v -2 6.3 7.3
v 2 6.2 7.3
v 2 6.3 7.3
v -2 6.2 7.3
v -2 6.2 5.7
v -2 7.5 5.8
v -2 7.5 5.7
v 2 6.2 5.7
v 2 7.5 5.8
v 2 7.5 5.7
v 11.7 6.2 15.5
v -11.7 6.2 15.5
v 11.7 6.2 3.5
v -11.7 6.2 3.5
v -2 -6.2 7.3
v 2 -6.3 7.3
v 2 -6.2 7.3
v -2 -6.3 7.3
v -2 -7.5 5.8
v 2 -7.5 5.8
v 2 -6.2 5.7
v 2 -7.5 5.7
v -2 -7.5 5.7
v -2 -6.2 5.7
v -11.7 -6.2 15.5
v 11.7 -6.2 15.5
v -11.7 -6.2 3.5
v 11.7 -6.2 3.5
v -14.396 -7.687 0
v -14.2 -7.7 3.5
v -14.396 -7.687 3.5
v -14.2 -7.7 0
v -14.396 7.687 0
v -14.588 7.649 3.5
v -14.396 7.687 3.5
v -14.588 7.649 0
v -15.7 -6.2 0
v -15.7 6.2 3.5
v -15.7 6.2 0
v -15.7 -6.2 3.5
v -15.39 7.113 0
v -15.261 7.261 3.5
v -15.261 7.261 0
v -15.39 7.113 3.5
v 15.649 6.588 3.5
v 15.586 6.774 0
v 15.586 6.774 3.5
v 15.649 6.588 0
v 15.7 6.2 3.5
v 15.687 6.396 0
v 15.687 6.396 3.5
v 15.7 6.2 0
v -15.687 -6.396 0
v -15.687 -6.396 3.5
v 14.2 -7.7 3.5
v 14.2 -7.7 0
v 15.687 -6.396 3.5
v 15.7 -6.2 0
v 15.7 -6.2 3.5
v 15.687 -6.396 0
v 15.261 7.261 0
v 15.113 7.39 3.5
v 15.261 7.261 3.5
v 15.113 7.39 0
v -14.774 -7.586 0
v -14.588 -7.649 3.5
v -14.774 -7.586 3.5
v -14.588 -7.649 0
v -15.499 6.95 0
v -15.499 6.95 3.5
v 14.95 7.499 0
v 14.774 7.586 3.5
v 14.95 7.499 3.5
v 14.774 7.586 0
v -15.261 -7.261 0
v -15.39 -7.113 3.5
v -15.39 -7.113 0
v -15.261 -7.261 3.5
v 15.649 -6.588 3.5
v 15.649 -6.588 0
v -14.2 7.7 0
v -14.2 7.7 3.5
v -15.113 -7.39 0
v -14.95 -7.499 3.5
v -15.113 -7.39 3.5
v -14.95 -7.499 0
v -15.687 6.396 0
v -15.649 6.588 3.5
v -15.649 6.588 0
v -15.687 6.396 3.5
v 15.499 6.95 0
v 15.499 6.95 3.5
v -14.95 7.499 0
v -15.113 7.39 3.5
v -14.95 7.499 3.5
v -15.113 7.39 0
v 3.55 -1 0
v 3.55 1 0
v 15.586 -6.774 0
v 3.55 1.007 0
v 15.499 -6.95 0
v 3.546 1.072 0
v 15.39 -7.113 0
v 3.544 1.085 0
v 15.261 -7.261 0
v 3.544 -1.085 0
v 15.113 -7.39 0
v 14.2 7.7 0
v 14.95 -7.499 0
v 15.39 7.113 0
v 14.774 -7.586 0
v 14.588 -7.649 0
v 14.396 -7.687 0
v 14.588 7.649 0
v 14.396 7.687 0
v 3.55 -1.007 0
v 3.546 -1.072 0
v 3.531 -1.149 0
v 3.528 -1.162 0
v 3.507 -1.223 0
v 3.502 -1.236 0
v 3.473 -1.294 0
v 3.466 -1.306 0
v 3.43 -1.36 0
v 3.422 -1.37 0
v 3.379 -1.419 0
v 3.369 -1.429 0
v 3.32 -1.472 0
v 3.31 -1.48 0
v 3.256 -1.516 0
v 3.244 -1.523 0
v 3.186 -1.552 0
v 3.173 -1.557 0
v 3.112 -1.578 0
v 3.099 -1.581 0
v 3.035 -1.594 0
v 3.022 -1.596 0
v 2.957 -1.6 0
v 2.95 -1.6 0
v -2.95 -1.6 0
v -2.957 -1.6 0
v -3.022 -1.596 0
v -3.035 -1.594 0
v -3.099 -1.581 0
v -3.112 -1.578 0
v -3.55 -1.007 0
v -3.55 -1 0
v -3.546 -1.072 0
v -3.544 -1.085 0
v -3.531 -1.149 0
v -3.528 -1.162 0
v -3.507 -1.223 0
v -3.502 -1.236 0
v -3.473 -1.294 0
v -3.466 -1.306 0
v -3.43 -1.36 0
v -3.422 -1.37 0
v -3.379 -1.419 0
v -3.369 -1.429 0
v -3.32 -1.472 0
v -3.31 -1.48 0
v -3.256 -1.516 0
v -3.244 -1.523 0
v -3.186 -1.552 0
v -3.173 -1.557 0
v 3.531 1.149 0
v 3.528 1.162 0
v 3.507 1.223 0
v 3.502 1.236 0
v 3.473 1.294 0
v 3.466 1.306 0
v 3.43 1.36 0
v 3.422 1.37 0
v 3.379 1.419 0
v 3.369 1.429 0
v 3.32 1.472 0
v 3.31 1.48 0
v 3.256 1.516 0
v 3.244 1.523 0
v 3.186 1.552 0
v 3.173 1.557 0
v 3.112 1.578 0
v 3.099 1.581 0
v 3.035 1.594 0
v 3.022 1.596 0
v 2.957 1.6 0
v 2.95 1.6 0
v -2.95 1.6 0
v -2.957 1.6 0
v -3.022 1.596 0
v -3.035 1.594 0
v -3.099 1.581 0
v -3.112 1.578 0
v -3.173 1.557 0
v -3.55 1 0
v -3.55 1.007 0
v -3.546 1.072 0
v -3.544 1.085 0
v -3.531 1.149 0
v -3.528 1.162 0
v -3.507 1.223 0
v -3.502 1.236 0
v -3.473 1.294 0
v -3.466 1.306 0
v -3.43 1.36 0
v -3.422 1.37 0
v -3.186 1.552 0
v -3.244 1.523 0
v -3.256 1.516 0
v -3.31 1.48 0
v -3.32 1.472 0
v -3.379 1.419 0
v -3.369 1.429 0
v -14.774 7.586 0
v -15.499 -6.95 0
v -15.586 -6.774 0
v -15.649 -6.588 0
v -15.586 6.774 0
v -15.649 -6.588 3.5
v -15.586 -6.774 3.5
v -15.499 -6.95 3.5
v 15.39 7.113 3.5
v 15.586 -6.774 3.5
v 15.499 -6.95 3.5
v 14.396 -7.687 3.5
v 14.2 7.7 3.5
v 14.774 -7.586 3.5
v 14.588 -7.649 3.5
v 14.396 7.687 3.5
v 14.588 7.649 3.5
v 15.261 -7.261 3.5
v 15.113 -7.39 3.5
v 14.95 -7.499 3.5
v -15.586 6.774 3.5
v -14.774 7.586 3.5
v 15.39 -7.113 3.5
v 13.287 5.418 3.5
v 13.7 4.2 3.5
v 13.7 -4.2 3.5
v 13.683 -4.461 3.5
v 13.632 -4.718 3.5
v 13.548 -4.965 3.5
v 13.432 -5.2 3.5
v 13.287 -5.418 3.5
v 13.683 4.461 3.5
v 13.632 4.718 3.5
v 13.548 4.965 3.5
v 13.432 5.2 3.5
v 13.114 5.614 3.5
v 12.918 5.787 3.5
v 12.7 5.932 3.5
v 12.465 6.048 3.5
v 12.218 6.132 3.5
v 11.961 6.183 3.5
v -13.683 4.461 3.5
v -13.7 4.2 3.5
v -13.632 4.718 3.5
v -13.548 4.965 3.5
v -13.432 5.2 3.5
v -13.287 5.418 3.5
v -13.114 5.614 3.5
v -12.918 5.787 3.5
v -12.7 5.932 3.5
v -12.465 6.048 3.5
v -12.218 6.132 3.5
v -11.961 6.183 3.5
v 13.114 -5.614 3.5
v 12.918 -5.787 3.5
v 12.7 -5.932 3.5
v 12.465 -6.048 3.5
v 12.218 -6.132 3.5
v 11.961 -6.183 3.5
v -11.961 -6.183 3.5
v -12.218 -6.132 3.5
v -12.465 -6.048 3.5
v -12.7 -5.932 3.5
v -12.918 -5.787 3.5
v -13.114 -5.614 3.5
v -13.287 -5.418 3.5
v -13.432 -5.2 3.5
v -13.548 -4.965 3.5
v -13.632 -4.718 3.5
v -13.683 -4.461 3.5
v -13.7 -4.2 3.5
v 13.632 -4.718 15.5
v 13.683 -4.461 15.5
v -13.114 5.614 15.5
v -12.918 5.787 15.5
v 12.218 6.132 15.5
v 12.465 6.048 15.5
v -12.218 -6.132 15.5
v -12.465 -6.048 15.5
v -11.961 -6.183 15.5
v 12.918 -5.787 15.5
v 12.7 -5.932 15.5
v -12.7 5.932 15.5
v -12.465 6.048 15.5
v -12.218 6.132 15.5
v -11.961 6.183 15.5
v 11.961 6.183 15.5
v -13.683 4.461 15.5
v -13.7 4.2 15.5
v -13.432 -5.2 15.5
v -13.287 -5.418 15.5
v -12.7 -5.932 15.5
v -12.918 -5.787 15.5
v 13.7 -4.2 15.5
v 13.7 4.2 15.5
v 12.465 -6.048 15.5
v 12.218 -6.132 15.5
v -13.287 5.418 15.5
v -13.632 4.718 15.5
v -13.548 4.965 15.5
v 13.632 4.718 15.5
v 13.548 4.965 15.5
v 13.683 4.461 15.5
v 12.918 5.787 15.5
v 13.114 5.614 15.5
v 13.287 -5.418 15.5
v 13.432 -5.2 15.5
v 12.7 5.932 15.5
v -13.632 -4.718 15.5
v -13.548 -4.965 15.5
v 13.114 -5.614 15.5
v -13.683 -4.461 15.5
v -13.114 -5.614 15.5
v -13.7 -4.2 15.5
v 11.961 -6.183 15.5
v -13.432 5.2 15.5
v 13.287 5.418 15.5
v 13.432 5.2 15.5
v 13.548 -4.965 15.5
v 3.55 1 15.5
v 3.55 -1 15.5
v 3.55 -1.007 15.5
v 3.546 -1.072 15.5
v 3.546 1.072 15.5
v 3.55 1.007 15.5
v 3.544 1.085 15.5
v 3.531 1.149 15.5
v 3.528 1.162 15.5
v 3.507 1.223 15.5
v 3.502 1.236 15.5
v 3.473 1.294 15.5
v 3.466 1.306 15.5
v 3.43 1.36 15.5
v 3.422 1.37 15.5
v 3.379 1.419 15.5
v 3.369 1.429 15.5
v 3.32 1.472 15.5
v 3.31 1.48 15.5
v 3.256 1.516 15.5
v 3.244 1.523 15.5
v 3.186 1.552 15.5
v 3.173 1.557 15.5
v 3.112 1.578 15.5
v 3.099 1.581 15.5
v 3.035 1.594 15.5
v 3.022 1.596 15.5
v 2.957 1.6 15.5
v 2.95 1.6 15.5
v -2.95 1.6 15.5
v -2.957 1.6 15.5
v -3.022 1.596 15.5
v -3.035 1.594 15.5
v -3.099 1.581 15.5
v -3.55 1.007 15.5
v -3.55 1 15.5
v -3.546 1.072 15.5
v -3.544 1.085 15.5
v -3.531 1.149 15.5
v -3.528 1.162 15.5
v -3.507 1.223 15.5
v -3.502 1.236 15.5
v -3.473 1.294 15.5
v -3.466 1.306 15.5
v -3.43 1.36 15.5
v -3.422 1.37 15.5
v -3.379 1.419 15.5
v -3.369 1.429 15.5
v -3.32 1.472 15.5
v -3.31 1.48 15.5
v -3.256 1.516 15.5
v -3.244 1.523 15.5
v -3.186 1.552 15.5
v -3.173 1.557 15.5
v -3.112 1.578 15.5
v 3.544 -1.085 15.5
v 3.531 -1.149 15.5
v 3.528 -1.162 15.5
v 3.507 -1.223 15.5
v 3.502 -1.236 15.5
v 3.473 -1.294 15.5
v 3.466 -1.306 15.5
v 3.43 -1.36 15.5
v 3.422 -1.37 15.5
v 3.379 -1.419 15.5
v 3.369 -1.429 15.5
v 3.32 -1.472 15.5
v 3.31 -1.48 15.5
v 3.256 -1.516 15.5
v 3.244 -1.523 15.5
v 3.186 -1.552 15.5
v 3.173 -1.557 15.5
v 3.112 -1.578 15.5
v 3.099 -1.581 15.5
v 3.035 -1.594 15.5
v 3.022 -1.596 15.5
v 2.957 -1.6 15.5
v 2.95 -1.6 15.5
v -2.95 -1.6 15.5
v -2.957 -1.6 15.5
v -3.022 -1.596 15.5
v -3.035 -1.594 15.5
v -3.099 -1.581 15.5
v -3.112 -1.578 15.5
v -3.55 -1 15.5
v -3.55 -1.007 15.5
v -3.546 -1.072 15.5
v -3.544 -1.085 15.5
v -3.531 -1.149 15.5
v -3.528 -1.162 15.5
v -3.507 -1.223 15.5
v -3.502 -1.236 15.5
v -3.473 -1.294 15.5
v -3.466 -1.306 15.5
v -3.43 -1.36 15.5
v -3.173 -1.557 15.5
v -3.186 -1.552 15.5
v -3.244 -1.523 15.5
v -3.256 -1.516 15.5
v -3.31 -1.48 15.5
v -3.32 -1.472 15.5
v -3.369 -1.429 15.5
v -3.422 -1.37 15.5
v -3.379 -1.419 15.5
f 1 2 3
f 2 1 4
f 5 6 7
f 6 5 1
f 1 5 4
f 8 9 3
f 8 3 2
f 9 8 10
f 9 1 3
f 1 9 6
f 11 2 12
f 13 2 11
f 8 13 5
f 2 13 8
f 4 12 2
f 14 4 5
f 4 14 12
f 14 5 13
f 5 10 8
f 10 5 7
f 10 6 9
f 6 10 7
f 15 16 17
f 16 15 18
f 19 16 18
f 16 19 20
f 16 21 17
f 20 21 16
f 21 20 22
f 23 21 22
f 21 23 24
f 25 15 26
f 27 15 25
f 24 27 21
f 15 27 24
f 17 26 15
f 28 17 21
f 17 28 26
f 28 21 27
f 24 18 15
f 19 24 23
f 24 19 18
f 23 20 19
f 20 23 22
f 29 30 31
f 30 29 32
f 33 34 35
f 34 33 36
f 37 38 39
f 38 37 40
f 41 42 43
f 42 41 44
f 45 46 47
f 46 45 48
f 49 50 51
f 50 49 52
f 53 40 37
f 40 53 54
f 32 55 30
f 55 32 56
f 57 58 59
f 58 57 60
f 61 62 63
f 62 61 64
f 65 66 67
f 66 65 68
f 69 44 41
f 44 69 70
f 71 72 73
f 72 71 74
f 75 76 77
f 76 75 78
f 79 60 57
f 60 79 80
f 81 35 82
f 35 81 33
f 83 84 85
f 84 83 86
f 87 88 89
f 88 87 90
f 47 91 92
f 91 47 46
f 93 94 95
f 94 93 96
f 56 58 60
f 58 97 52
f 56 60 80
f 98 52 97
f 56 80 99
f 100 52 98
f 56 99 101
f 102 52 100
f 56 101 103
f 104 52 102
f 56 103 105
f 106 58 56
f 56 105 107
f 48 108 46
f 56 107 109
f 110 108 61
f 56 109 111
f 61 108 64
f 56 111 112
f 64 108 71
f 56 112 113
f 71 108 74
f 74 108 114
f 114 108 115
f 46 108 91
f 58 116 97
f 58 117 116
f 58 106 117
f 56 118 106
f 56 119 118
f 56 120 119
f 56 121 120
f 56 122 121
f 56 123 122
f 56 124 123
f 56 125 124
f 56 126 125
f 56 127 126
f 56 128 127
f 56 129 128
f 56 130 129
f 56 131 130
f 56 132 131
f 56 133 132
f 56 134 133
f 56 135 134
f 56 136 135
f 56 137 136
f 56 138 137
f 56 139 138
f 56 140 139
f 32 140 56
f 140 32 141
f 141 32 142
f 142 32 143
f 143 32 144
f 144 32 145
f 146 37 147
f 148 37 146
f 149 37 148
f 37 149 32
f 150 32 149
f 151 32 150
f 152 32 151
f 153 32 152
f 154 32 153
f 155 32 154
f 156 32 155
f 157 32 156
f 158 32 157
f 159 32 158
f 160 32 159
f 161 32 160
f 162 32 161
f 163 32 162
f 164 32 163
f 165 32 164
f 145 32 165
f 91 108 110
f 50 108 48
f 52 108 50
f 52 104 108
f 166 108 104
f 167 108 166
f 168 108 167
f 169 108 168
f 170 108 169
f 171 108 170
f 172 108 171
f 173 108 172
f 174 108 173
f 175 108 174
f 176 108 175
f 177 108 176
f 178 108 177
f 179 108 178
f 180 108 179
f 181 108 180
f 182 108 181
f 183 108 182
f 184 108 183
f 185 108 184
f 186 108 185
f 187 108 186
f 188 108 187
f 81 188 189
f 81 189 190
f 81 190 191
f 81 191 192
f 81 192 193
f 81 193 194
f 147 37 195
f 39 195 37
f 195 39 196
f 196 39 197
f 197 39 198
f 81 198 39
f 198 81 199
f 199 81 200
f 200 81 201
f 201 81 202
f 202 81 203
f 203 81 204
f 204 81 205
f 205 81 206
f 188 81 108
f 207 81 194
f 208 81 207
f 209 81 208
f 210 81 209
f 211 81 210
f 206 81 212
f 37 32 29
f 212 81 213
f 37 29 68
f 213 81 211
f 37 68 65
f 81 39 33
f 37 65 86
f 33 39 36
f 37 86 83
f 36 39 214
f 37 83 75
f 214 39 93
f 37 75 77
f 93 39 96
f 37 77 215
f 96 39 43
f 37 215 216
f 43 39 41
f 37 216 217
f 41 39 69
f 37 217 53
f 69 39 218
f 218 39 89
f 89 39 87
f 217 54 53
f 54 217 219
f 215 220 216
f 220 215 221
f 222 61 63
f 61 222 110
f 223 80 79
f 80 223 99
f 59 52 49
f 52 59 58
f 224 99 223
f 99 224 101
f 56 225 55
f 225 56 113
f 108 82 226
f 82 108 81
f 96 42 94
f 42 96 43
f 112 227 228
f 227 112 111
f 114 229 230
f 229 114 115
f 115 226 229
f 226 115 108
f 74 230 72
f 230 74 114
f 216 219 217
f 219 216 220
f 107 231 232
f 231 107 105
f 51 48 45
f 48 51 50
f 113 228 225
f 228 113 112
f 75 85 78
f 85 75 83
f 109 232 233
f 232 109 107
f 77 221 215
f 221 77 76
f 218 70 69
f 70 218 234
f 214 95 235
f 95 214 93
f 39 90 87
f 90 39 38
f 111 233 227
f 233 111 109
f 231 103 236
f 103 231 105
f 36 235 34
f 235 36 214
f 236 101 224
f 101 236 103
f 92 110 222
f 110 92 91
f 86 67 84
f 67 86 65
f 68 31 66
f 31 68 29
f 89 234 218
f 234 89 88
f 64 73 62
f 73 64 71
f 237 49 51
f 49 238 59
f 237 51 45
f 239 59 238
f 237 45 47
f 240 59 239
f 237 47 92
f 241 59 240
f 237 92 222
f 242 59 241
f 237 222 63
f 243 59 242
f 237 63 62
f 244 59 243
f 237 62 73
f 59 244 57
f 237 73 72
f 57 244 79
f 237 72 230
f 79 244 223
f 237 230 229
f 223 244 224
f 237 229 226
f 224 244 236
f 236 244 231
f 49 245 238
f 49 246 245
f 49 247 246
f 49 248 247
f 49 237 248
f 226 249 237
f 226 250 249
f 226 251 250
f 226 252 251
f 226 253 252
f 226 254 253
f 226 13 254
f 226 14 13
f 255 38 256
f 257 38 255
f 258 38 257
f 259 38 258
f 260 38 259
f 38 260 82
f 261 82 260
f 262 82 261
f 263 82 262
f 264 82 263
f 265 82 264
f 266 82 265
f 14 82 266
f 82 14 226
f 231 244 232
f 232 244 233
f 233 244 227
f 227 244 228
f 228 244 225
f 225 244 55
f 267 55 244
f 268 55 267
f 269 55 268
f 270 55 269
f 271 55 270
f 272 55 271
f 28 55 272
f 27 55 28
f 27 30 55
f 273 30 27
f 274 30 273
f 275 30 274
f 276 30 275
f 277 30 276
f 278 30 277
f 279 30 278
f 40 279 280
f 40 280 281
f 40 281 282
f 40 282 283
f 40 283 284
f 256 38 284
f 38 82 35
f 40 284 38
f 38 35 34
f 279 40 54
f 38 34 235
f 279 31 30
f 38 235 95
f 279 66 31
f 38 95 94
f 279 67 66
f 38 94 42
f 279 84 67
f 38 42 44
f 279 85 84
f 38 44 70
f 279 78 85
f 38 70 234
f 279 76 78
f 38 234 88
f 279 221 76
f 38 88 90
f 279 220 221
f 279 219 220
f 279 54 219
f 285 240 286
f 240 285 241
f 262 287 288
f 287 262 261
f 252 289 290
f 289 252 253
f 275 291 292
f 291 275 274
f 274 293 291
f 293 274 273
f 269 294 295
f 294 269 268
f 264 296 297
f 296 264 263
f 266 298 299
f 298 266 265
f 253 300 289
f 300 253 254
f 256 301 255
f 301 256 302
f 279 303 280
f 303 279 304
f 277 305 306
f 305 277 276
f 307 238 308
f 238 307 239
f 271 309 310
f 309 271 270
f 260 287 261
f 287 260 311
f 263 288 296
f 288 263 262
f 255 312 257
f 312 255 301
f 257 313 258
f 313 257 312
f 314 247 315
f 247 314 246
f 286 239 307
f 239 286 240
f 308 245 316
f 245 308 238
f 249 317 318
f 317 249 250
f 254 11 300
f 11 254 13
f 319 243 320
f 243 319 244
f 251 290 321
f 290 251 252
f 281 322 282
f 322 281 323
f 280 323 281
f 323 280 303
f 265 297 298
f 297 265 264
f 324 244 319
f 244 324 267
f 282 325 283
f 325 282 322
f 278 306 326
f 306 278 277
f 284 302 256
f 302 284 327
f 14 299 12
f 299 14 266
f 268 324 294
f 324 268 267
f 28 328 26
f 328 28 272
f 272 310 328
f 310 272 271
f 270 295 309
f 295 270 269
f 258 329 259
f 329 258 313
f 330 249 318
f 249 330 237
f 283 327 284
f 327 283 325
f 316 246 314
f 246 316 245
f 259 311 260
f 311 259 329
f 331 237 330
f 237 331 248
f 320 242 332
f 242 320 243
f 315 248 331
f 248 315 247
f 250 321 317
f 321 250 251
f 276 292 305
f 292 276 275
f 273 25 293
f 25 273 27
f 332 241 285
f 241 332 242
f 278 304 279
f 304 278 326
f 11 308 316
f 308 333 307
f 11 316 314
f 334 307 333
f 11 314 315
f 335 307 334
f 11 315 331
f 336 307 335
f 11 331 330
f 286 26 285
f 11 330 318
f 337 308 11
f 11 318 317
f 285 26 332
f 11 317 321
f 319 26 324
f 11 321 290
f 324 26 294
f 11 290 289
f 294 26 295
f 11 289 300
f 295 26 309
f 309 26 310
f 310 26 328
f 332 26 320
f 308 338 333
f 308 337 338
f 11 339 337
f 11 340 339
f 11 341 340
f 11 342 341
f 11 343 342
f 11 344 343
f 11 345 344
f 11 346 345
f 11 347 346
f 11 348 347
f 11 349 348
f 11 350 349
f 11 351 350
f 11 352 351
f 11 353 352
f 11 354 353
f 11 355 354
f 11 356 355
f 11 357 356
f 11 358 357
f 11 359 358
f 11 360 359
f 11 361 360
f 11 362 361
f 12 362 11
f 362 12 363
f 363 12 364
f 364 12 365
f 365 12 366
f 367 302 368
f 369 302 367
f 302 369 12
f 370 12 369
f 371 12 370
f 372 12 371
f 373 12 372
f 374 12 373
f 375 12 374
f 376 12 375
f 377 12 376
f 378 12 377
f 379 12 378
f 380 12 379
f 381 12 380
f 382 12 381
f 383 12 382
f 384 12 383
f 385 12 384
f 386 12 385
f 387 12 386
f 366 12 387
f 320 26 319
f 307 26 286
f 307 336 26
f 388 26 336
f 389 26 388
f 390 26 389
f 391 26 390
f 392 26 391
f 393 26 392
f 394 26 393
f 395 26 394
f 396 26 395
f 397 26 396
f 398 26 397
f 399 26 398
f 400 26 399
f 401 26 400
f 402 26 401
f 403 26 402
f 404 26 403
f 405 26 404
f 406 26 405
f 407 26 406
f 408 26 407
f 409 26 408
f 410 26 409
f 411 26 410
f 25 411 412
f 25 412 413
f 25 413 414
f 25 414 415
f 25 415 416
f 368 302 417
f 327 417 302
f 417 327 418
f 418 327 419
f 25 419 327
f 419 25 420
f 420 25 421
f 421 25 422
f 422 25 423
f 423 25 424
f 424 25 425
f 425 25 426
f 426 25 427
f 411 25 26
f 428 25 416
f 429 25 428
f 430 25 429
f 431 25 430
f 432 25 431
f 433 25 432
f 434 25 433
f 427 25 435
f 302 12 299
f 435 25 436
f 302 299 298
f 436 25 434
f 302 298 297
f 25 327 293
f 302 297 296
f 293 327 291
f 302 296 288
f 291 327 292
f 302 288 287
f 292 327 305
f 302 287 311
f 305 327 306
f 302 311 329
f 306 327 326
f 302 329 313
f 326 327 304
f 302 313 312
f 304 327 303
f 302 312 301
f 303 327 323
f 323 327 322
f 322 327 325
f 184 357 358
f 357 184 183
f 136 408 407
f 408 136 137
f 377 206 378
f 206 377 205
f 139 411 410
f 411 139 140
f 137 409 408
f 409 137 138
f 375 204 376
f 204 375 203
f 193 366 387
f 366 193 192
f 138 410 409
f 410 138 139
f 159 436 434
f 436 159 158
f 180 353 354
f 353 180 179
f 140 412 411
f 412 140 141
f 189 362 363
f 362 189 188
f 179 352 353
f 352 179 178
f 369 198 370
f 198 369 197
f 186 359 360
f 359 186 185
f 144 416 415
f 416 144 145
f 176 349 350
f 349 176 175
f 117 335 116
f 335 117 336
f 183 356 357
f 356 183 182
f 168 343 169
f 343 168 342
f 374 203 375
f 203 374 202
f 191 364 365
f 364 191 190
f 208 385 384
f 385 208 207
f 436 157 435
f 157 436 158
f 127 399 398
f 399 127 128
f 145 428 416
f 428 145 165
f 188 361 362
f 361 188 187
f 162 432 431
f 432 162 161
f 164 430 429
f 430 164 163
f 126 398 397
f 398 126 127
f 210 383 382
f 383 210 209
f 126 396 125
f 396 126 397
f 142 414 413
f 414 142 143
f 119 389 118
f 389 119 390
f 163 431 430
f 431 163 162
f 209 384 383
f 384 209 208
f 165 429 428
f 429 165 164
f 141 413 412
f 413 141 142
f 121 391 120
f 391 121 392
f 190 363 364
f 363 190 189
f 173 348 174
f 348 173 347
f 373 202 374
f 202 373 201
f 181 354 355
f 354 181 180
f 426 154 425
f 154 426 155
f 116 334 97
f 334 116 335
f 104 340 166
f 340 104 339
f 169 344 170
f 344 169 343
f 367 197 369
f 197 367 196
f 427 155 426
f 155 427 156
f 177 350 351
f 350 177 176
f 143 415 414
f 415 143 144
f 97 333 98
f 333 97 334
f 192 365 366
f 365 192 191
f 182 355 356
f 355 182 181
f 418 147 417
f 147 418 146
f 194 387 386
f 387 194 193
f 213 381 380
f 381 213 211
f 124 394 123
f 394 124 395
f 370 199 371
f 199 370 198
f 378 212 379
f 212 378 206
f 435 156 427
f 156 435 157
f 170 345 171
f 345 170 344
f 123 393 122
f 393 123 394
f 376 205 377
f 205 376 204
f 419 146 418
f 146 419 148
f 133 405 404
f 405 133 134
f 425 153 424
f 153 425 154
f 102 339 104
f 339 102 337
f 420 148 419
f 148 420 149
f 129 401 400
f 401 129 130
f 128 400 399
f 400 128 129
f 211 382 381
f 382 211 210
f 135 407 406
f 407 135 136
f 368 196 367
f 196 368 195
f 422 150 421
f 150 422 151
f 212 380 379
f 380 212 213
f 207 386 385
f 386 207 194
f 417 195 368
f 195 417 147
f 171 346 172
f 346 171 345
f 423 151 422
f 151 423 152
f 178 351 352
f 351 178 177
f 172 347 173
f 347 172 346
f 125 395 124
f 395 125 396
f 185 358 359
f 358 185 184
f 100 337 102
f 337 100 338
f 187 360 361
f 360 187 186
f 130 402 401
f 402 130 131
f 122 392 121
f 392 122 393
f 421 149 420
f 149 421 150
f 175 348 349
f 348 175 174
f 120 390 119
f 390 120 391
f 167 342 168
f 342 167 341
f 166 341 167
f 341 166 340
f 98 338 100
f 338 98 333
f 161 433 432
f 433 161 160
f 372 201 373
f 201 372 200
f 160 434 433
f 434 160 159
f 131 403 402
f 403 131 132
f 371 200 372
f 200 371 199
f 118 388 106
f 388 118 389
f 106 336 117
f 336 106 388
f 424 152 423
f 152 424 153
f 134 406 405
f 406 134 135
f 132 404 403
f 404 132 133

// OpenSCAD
// file: parameters.scad
// ============================================
// MODULAR CABLE ORGANIZER - SHARED PARAMETERS
// ============================================
// All dimensions in mm - include this in all files
// ============================================

$fn = 48;

// === TOLERANCES ===
clearance = 0.3;
port_clearance = 0.1;  // Extra clearance for port openings (reduced - 0.2 was too loose for USB-C)
wall = 1.6;

// === SLOT DIMENSIONS (2:1 aspect ratio) - scaled to 2/3 ===
slot_width = 32;  // Reduced by 1mm for more compact insert
slot_height = 16;  // Reduced by 1mm for more compact insert
slot_depth = 4;  // Reduced from 6mm - less frame depth needed

// === FRAME STRUCTURE ===
frame_wall = 0.5;   // Reduced for more compact frame
frame_border = 8;  // Increased by 10mm for mounting holes with countersink
frame_back = 2;     // Slightly thicker for snap catch strength
mount_hole_dia = 3;
countersink_dia = 6;  // Diameter of countersink for screw heads
countersink_depth = 2;  // Depth of countersink

// === GRID ===
grid_cols = 2;
grid_rows = 2;

// === INSERT BASE DIMENSIONS ===
insert_width = slot_width - (2 * clearance);
insert_height = slot_height - (2 * clearance);
insert_base_depth = slot_depth - 0.5;

// === INSERT BODY (protrudes from frame) ===
insert_body_width = insert_width - 4;
insert_body_height = insert_height - 3;
insert_body_depth = 12;  // Deep enough to accommodate male cable connectors
insert_top_thick = 1.5;  // Top platform thickness

// === SNAP TABS (on neck/body - catch on back plate) ===
snap_tab_width = 4;
snap_tab_protrude = 1.2;  // How far tab sticks out from body
snap_tab_thick = 1.5;     // Z thickness of tab
snap_tab_offset = 2.2;      // Distance from base to tab bottom on insert (increased to clear frame)

// === CONNECTOR PORT DIMENSIONS & BODY DEPTHS ===
// Port dimensions from reference blueprints
// Body depths sized to match typical male connector lengths

// USB-C: 8.4 x 2.6mm, male connector ~9mm
usbc_w = 8.4;
usbc_h = 2.6;
usbc_r = 1.0;
usbc_body_depth = 9;

// USB-A: 14.0 x 6.5mm, male connector ~13mm
usba_w = 14.0;
usba_h = 6.5;
usba_r = 0.5;
usba_body_depth = 13;

// USB Mini: 6.9 x 3.0mm, male connector ~9mm
usb_mini_w = 6.9;
usb_mini_h = 3.0;
usb_mini_r = 0.5;
usb_mini_body_depth = 9;

// USB Micro: 6.9 x 1.8mm, male connector ~7mm
usb_micro_w = 6.9;
usb_micro_h = 1.8;
usb_micro_r = 0.3;
usb_micro_body_depth = 7;

// USB-B: 8.0 x 7.5mm, male connector ~14mm
usb_b_w = 8.0;
usb_b_h = 7.5;
usb_b_r = 1.0;
usb_b_body_depth = 14;

// Lightning: 6.7 x 1.5mm, male connector ~8mm
lightning_w = 6.7;
lightning_h = 1.5;
lightning_r = 0.5;
lightning_body_depth = 8;

// HDMI: 14.0 x 4.5mm, male connector ~16mm
hdmi_w = 14.0;
hdmi_h = 4.5;
hdmi_r = 0.5;
hdmi_body_depth = 16;

// 3.5mm Audio Jack: male plug ~14mm
audio_jack_dia = 6.0;
audio_jack_body_depth = 14;

// Blank/Label: recessed area for label
label_w = 30;
label_h = 12;
label_depth = 0.8;

// === CALCULATED VALUES ===
frame_total_depth = frame_back + slot_depth;
grid_width = (grid_cols * slot_width) + ((grid_cols - 1) * frame_wall);
grid_height = (grid_rows * slot_height) + ((grid_rows - 1) * frame_wall);
frame_width = grid_width + (2 * frame_border);
frame_height_total = grid_height + (2 * frame_border);
insert_total_depth = insert_base_depth + insert_body_depth;
// file: insert_base.scad
// ============================================
// MODULAR CABLE ORGANIZER - BASE INSERT MODULE
// ============================================
// This is the parent module for all insert types
// Include this file and call insert_with_port() with a port shape
// ============================================

include <parameters.scad>

// === BASE INSERT WITH CUSTOM BODY DEPTH ===
module insert_blank_custom(body_depth) {
    union() {
        // Base plate (sits in frame slot)
        rounded_box_rect(insert_width, insert_height, insert_base_depth, 1.5);
        
        // Body (protrudes out front) - custom depth
        translate([0, 0, insert_base_depth])
            rounded_box_rect(insert_body_width, insert_body_height, body_depth, 2);
        
        // Snap tabs on all 4 sides
        snap_tabs_all();
    }
}

// === BASE INSERT (default depth - for backwards compatibility) ===
module insert_blank() {
    insert_blank_custom(insert_body_depth);
}

// === INSERT WITH THROUGH-HOLE PORT (custom depth) ===
// Pass body_depth and a 2D shape as children
module insert_with_port_custom(body_depth) {
    total_depth = insert_base_depth + body_depth;
    difference() {
        insert_blank_custom(body_depth);
        
        // Cut port hole ALL THE WAY through (tube shape)
        translate([0, 0, -0.1])
            linear_extrude(total_depth + 0.2)
            offset(r=port_clearance)  // Add clearance to port opening
            children();
    }
}

// === INSERT WITH THROUGH-HOLE PORT (default depth) ===
module insert_with_port() {
    insert_with_port_custom(insert_body_depth) children();
}

// === PRE-MADE INSERT MODULES WITH CORRECT DEPTHS ===
module insert_usbc() {
    insert_with_port_custom(usbc_body_depth) port_usbc();
}

module insert_usba() {
    insert_with_port_custom(usba_body_depth) port_usba();
}

module insert_usb_mini() {
    insert_with_port_custom(usb_mini_body_depth) port_usb_mini();
}

module insert_usb_micro() {
    insert_with_port_custom(usb_micro_body_depth) port_usb_micro();
}

module insert_usb_b() {
    insert_with_port_custom(usb_b_body_depth) port_usb_b();
}

module insert_lightning() {
    insert_with_port_custom(lightning_body_depth) port_lightning();
}

module insert_hdmi() {
    insert_with_port_custom(hdmi_body_depth) port_hdmi();
}

module insert_audio_jack() {
    insert_with_port_custom(audio_jack_body_depth) port_audio_jack();
}

// === SNAP TABS (on neck/body - catch on frame cutouts) ===
// Tabs are on the body, positioned to engage with frame wall cutouts
module snap_tabs_all() {
    // Position tabs up on body (clear of base/frame)
    tab_z = insert_base_depth + snap_tab_offset;
    
    // Tabs on all 4 sides of the body
    for (angle = [0, 90, 180, 270]) {
        rotate([0, 0, angle])
            translate([0, insert_body_height/2, tab_z])
            neck_snap_tab();
    }
}

module neck_snap_tab() {
    // Wedge shape (FLIPPED): 
    // - Peak/taper on BOTTOM - slides past back plate when inserting
    // - Flat on TOP - catches and holds
    hull() {
        // Peak of wedge (protruding, at BOTTOM of tab)
        translate([-snap_tab_width/2, snap_tab_protrude, 0])
            cube([snap_tab_width, 0.1, 0.1]);
        // Flat top (at body surface, TOP of tab)
        translate([-snap_tab_width/2, 0, snap_tab_thick])
            cube([snap_tab_width, 0.1, 0.1]);
        // Base of wedge (at body surface, bottom)
        translate([-snap_tab_width/2, 0, 0])
            cube([snap_tab_width, 0.1, 0.1]);
    }
}

module snap_tab_horizontal() {
    hull() {
        translate([0, -snap_tab_protrude/2, 0])
            cube([snap_tab_width, 0.1, snap_tab_thick], center=true);
        translate([0, snap_tab_protrude/2, snap_tab_thick * 0.2])
            cube([snap_tab_width, 0.1, snap_tab_thick * 0.6], center=true);
    }
}

module snap_tab_vertical() {
    hull() {
        translate([-snap_tab_protrude/2, 0, 0])
            cube([0.1, snap_tab_width, snap_tab_thick], center=true);
        translate([snap_tab_protrude/2, 0, snap_tab_thick * 0.2])
            cube([0.1, snap_tab_width, snap_tab_thick * 0.6], center=true);
    }
}

// === UTILITY MODULES ===
module rounded_box_rect(w, d, h, r) {
    translate([0, 0, h/2])
        hull() {
            for (x = [-1, 1], y = [-1, 1])
                translate([x * (w/2 - r), y * (d/2 - r), 0])
                    cylinder(h=h, r=r, center=true);
        }
}

// === PORT SHAPE MODULES (2D) ===
// These define the cutout shapes for each connector type

module port_rounded_rect(w, h, r) {
    // Standard rounded rectangle
    hull() {
        for (x = [-1, 1], y = [-1, 1])
            translate([x * (w/2 - r), y * (h/2 - r)])
                circle(r=r);
    }
}

module port_usbc() {
    port_rounded_rect(usbc_w, usbc_h, usbc_r);
}

module port_usba() {
    port_rounded_rect(usba_w, usba_h, usba_r);
}

module port_usb_mini() {
    port_rounded_rect(usb_mini_w, usb_mini_h, usb_mini_r);
}

module port_usb_micro() {
    port_rounded_rect(usb_micro_w, usb_micro_h, usb_micro_r);
}

module port_usb_b() {
    // USB-B has beveled top corners
    hull() {
        // Bottom corners (full radius)
        for (x = [-1, 1])
            translate([x * (usb_b_w/2 - usb_b_r), -(usb_b_h/2 - usb_b_r)])
                circle(r=usb_b_r);
        // Top corners (chamfered - moved inward)
        for (x = [-1, 1])
            translate([x * (usb_b_w/2 - usb_b_r - 1), (usb_b_h/2 - usb_b_r)])
                circle(r=usb_b_r);
    }
}

module port_lightning() {
    port_rounded_rect(lightning_w, lightning_h, lightning_r);
}

module port_hdmi() {
    // HDMI is tapered (wider at top)
    hull() {
        // Top (wider)
        for (x = [-1, 1])
            translate([x * (hdmi_w/2 - hdmi_r), (hdmi_h/2 - hdmi_r)])
                circle(r=hdmi_r);
        // Bottom (narrower)
        for (x = [-1, 1])
            translate([x * (hdmi_w/2 - hdmi_r - 1), -(hdmi_h/2 - hdmi_r)])
                circle(r=hdmi_r);
    }
}

module port_audio_jack() {
    circle(d=audio_jack_dia);
}

module port_label_recess() {
    // Shallow rectangular recess for labels
    square([label_w, label_h], center=true);
}

// === RENDER (for testing this file directly) ===
// insert_blank();
// main file
// ============================================
// USB MINI FEMALE INSERT
// Port: 6.9mm x 3.0mm rounded rectangle
// ============================================

include <insert_base.scad>

module insert_usb_mini() {
    insert_with_port() port_usb_mini();
}

// Render
insert_usb_mini();
